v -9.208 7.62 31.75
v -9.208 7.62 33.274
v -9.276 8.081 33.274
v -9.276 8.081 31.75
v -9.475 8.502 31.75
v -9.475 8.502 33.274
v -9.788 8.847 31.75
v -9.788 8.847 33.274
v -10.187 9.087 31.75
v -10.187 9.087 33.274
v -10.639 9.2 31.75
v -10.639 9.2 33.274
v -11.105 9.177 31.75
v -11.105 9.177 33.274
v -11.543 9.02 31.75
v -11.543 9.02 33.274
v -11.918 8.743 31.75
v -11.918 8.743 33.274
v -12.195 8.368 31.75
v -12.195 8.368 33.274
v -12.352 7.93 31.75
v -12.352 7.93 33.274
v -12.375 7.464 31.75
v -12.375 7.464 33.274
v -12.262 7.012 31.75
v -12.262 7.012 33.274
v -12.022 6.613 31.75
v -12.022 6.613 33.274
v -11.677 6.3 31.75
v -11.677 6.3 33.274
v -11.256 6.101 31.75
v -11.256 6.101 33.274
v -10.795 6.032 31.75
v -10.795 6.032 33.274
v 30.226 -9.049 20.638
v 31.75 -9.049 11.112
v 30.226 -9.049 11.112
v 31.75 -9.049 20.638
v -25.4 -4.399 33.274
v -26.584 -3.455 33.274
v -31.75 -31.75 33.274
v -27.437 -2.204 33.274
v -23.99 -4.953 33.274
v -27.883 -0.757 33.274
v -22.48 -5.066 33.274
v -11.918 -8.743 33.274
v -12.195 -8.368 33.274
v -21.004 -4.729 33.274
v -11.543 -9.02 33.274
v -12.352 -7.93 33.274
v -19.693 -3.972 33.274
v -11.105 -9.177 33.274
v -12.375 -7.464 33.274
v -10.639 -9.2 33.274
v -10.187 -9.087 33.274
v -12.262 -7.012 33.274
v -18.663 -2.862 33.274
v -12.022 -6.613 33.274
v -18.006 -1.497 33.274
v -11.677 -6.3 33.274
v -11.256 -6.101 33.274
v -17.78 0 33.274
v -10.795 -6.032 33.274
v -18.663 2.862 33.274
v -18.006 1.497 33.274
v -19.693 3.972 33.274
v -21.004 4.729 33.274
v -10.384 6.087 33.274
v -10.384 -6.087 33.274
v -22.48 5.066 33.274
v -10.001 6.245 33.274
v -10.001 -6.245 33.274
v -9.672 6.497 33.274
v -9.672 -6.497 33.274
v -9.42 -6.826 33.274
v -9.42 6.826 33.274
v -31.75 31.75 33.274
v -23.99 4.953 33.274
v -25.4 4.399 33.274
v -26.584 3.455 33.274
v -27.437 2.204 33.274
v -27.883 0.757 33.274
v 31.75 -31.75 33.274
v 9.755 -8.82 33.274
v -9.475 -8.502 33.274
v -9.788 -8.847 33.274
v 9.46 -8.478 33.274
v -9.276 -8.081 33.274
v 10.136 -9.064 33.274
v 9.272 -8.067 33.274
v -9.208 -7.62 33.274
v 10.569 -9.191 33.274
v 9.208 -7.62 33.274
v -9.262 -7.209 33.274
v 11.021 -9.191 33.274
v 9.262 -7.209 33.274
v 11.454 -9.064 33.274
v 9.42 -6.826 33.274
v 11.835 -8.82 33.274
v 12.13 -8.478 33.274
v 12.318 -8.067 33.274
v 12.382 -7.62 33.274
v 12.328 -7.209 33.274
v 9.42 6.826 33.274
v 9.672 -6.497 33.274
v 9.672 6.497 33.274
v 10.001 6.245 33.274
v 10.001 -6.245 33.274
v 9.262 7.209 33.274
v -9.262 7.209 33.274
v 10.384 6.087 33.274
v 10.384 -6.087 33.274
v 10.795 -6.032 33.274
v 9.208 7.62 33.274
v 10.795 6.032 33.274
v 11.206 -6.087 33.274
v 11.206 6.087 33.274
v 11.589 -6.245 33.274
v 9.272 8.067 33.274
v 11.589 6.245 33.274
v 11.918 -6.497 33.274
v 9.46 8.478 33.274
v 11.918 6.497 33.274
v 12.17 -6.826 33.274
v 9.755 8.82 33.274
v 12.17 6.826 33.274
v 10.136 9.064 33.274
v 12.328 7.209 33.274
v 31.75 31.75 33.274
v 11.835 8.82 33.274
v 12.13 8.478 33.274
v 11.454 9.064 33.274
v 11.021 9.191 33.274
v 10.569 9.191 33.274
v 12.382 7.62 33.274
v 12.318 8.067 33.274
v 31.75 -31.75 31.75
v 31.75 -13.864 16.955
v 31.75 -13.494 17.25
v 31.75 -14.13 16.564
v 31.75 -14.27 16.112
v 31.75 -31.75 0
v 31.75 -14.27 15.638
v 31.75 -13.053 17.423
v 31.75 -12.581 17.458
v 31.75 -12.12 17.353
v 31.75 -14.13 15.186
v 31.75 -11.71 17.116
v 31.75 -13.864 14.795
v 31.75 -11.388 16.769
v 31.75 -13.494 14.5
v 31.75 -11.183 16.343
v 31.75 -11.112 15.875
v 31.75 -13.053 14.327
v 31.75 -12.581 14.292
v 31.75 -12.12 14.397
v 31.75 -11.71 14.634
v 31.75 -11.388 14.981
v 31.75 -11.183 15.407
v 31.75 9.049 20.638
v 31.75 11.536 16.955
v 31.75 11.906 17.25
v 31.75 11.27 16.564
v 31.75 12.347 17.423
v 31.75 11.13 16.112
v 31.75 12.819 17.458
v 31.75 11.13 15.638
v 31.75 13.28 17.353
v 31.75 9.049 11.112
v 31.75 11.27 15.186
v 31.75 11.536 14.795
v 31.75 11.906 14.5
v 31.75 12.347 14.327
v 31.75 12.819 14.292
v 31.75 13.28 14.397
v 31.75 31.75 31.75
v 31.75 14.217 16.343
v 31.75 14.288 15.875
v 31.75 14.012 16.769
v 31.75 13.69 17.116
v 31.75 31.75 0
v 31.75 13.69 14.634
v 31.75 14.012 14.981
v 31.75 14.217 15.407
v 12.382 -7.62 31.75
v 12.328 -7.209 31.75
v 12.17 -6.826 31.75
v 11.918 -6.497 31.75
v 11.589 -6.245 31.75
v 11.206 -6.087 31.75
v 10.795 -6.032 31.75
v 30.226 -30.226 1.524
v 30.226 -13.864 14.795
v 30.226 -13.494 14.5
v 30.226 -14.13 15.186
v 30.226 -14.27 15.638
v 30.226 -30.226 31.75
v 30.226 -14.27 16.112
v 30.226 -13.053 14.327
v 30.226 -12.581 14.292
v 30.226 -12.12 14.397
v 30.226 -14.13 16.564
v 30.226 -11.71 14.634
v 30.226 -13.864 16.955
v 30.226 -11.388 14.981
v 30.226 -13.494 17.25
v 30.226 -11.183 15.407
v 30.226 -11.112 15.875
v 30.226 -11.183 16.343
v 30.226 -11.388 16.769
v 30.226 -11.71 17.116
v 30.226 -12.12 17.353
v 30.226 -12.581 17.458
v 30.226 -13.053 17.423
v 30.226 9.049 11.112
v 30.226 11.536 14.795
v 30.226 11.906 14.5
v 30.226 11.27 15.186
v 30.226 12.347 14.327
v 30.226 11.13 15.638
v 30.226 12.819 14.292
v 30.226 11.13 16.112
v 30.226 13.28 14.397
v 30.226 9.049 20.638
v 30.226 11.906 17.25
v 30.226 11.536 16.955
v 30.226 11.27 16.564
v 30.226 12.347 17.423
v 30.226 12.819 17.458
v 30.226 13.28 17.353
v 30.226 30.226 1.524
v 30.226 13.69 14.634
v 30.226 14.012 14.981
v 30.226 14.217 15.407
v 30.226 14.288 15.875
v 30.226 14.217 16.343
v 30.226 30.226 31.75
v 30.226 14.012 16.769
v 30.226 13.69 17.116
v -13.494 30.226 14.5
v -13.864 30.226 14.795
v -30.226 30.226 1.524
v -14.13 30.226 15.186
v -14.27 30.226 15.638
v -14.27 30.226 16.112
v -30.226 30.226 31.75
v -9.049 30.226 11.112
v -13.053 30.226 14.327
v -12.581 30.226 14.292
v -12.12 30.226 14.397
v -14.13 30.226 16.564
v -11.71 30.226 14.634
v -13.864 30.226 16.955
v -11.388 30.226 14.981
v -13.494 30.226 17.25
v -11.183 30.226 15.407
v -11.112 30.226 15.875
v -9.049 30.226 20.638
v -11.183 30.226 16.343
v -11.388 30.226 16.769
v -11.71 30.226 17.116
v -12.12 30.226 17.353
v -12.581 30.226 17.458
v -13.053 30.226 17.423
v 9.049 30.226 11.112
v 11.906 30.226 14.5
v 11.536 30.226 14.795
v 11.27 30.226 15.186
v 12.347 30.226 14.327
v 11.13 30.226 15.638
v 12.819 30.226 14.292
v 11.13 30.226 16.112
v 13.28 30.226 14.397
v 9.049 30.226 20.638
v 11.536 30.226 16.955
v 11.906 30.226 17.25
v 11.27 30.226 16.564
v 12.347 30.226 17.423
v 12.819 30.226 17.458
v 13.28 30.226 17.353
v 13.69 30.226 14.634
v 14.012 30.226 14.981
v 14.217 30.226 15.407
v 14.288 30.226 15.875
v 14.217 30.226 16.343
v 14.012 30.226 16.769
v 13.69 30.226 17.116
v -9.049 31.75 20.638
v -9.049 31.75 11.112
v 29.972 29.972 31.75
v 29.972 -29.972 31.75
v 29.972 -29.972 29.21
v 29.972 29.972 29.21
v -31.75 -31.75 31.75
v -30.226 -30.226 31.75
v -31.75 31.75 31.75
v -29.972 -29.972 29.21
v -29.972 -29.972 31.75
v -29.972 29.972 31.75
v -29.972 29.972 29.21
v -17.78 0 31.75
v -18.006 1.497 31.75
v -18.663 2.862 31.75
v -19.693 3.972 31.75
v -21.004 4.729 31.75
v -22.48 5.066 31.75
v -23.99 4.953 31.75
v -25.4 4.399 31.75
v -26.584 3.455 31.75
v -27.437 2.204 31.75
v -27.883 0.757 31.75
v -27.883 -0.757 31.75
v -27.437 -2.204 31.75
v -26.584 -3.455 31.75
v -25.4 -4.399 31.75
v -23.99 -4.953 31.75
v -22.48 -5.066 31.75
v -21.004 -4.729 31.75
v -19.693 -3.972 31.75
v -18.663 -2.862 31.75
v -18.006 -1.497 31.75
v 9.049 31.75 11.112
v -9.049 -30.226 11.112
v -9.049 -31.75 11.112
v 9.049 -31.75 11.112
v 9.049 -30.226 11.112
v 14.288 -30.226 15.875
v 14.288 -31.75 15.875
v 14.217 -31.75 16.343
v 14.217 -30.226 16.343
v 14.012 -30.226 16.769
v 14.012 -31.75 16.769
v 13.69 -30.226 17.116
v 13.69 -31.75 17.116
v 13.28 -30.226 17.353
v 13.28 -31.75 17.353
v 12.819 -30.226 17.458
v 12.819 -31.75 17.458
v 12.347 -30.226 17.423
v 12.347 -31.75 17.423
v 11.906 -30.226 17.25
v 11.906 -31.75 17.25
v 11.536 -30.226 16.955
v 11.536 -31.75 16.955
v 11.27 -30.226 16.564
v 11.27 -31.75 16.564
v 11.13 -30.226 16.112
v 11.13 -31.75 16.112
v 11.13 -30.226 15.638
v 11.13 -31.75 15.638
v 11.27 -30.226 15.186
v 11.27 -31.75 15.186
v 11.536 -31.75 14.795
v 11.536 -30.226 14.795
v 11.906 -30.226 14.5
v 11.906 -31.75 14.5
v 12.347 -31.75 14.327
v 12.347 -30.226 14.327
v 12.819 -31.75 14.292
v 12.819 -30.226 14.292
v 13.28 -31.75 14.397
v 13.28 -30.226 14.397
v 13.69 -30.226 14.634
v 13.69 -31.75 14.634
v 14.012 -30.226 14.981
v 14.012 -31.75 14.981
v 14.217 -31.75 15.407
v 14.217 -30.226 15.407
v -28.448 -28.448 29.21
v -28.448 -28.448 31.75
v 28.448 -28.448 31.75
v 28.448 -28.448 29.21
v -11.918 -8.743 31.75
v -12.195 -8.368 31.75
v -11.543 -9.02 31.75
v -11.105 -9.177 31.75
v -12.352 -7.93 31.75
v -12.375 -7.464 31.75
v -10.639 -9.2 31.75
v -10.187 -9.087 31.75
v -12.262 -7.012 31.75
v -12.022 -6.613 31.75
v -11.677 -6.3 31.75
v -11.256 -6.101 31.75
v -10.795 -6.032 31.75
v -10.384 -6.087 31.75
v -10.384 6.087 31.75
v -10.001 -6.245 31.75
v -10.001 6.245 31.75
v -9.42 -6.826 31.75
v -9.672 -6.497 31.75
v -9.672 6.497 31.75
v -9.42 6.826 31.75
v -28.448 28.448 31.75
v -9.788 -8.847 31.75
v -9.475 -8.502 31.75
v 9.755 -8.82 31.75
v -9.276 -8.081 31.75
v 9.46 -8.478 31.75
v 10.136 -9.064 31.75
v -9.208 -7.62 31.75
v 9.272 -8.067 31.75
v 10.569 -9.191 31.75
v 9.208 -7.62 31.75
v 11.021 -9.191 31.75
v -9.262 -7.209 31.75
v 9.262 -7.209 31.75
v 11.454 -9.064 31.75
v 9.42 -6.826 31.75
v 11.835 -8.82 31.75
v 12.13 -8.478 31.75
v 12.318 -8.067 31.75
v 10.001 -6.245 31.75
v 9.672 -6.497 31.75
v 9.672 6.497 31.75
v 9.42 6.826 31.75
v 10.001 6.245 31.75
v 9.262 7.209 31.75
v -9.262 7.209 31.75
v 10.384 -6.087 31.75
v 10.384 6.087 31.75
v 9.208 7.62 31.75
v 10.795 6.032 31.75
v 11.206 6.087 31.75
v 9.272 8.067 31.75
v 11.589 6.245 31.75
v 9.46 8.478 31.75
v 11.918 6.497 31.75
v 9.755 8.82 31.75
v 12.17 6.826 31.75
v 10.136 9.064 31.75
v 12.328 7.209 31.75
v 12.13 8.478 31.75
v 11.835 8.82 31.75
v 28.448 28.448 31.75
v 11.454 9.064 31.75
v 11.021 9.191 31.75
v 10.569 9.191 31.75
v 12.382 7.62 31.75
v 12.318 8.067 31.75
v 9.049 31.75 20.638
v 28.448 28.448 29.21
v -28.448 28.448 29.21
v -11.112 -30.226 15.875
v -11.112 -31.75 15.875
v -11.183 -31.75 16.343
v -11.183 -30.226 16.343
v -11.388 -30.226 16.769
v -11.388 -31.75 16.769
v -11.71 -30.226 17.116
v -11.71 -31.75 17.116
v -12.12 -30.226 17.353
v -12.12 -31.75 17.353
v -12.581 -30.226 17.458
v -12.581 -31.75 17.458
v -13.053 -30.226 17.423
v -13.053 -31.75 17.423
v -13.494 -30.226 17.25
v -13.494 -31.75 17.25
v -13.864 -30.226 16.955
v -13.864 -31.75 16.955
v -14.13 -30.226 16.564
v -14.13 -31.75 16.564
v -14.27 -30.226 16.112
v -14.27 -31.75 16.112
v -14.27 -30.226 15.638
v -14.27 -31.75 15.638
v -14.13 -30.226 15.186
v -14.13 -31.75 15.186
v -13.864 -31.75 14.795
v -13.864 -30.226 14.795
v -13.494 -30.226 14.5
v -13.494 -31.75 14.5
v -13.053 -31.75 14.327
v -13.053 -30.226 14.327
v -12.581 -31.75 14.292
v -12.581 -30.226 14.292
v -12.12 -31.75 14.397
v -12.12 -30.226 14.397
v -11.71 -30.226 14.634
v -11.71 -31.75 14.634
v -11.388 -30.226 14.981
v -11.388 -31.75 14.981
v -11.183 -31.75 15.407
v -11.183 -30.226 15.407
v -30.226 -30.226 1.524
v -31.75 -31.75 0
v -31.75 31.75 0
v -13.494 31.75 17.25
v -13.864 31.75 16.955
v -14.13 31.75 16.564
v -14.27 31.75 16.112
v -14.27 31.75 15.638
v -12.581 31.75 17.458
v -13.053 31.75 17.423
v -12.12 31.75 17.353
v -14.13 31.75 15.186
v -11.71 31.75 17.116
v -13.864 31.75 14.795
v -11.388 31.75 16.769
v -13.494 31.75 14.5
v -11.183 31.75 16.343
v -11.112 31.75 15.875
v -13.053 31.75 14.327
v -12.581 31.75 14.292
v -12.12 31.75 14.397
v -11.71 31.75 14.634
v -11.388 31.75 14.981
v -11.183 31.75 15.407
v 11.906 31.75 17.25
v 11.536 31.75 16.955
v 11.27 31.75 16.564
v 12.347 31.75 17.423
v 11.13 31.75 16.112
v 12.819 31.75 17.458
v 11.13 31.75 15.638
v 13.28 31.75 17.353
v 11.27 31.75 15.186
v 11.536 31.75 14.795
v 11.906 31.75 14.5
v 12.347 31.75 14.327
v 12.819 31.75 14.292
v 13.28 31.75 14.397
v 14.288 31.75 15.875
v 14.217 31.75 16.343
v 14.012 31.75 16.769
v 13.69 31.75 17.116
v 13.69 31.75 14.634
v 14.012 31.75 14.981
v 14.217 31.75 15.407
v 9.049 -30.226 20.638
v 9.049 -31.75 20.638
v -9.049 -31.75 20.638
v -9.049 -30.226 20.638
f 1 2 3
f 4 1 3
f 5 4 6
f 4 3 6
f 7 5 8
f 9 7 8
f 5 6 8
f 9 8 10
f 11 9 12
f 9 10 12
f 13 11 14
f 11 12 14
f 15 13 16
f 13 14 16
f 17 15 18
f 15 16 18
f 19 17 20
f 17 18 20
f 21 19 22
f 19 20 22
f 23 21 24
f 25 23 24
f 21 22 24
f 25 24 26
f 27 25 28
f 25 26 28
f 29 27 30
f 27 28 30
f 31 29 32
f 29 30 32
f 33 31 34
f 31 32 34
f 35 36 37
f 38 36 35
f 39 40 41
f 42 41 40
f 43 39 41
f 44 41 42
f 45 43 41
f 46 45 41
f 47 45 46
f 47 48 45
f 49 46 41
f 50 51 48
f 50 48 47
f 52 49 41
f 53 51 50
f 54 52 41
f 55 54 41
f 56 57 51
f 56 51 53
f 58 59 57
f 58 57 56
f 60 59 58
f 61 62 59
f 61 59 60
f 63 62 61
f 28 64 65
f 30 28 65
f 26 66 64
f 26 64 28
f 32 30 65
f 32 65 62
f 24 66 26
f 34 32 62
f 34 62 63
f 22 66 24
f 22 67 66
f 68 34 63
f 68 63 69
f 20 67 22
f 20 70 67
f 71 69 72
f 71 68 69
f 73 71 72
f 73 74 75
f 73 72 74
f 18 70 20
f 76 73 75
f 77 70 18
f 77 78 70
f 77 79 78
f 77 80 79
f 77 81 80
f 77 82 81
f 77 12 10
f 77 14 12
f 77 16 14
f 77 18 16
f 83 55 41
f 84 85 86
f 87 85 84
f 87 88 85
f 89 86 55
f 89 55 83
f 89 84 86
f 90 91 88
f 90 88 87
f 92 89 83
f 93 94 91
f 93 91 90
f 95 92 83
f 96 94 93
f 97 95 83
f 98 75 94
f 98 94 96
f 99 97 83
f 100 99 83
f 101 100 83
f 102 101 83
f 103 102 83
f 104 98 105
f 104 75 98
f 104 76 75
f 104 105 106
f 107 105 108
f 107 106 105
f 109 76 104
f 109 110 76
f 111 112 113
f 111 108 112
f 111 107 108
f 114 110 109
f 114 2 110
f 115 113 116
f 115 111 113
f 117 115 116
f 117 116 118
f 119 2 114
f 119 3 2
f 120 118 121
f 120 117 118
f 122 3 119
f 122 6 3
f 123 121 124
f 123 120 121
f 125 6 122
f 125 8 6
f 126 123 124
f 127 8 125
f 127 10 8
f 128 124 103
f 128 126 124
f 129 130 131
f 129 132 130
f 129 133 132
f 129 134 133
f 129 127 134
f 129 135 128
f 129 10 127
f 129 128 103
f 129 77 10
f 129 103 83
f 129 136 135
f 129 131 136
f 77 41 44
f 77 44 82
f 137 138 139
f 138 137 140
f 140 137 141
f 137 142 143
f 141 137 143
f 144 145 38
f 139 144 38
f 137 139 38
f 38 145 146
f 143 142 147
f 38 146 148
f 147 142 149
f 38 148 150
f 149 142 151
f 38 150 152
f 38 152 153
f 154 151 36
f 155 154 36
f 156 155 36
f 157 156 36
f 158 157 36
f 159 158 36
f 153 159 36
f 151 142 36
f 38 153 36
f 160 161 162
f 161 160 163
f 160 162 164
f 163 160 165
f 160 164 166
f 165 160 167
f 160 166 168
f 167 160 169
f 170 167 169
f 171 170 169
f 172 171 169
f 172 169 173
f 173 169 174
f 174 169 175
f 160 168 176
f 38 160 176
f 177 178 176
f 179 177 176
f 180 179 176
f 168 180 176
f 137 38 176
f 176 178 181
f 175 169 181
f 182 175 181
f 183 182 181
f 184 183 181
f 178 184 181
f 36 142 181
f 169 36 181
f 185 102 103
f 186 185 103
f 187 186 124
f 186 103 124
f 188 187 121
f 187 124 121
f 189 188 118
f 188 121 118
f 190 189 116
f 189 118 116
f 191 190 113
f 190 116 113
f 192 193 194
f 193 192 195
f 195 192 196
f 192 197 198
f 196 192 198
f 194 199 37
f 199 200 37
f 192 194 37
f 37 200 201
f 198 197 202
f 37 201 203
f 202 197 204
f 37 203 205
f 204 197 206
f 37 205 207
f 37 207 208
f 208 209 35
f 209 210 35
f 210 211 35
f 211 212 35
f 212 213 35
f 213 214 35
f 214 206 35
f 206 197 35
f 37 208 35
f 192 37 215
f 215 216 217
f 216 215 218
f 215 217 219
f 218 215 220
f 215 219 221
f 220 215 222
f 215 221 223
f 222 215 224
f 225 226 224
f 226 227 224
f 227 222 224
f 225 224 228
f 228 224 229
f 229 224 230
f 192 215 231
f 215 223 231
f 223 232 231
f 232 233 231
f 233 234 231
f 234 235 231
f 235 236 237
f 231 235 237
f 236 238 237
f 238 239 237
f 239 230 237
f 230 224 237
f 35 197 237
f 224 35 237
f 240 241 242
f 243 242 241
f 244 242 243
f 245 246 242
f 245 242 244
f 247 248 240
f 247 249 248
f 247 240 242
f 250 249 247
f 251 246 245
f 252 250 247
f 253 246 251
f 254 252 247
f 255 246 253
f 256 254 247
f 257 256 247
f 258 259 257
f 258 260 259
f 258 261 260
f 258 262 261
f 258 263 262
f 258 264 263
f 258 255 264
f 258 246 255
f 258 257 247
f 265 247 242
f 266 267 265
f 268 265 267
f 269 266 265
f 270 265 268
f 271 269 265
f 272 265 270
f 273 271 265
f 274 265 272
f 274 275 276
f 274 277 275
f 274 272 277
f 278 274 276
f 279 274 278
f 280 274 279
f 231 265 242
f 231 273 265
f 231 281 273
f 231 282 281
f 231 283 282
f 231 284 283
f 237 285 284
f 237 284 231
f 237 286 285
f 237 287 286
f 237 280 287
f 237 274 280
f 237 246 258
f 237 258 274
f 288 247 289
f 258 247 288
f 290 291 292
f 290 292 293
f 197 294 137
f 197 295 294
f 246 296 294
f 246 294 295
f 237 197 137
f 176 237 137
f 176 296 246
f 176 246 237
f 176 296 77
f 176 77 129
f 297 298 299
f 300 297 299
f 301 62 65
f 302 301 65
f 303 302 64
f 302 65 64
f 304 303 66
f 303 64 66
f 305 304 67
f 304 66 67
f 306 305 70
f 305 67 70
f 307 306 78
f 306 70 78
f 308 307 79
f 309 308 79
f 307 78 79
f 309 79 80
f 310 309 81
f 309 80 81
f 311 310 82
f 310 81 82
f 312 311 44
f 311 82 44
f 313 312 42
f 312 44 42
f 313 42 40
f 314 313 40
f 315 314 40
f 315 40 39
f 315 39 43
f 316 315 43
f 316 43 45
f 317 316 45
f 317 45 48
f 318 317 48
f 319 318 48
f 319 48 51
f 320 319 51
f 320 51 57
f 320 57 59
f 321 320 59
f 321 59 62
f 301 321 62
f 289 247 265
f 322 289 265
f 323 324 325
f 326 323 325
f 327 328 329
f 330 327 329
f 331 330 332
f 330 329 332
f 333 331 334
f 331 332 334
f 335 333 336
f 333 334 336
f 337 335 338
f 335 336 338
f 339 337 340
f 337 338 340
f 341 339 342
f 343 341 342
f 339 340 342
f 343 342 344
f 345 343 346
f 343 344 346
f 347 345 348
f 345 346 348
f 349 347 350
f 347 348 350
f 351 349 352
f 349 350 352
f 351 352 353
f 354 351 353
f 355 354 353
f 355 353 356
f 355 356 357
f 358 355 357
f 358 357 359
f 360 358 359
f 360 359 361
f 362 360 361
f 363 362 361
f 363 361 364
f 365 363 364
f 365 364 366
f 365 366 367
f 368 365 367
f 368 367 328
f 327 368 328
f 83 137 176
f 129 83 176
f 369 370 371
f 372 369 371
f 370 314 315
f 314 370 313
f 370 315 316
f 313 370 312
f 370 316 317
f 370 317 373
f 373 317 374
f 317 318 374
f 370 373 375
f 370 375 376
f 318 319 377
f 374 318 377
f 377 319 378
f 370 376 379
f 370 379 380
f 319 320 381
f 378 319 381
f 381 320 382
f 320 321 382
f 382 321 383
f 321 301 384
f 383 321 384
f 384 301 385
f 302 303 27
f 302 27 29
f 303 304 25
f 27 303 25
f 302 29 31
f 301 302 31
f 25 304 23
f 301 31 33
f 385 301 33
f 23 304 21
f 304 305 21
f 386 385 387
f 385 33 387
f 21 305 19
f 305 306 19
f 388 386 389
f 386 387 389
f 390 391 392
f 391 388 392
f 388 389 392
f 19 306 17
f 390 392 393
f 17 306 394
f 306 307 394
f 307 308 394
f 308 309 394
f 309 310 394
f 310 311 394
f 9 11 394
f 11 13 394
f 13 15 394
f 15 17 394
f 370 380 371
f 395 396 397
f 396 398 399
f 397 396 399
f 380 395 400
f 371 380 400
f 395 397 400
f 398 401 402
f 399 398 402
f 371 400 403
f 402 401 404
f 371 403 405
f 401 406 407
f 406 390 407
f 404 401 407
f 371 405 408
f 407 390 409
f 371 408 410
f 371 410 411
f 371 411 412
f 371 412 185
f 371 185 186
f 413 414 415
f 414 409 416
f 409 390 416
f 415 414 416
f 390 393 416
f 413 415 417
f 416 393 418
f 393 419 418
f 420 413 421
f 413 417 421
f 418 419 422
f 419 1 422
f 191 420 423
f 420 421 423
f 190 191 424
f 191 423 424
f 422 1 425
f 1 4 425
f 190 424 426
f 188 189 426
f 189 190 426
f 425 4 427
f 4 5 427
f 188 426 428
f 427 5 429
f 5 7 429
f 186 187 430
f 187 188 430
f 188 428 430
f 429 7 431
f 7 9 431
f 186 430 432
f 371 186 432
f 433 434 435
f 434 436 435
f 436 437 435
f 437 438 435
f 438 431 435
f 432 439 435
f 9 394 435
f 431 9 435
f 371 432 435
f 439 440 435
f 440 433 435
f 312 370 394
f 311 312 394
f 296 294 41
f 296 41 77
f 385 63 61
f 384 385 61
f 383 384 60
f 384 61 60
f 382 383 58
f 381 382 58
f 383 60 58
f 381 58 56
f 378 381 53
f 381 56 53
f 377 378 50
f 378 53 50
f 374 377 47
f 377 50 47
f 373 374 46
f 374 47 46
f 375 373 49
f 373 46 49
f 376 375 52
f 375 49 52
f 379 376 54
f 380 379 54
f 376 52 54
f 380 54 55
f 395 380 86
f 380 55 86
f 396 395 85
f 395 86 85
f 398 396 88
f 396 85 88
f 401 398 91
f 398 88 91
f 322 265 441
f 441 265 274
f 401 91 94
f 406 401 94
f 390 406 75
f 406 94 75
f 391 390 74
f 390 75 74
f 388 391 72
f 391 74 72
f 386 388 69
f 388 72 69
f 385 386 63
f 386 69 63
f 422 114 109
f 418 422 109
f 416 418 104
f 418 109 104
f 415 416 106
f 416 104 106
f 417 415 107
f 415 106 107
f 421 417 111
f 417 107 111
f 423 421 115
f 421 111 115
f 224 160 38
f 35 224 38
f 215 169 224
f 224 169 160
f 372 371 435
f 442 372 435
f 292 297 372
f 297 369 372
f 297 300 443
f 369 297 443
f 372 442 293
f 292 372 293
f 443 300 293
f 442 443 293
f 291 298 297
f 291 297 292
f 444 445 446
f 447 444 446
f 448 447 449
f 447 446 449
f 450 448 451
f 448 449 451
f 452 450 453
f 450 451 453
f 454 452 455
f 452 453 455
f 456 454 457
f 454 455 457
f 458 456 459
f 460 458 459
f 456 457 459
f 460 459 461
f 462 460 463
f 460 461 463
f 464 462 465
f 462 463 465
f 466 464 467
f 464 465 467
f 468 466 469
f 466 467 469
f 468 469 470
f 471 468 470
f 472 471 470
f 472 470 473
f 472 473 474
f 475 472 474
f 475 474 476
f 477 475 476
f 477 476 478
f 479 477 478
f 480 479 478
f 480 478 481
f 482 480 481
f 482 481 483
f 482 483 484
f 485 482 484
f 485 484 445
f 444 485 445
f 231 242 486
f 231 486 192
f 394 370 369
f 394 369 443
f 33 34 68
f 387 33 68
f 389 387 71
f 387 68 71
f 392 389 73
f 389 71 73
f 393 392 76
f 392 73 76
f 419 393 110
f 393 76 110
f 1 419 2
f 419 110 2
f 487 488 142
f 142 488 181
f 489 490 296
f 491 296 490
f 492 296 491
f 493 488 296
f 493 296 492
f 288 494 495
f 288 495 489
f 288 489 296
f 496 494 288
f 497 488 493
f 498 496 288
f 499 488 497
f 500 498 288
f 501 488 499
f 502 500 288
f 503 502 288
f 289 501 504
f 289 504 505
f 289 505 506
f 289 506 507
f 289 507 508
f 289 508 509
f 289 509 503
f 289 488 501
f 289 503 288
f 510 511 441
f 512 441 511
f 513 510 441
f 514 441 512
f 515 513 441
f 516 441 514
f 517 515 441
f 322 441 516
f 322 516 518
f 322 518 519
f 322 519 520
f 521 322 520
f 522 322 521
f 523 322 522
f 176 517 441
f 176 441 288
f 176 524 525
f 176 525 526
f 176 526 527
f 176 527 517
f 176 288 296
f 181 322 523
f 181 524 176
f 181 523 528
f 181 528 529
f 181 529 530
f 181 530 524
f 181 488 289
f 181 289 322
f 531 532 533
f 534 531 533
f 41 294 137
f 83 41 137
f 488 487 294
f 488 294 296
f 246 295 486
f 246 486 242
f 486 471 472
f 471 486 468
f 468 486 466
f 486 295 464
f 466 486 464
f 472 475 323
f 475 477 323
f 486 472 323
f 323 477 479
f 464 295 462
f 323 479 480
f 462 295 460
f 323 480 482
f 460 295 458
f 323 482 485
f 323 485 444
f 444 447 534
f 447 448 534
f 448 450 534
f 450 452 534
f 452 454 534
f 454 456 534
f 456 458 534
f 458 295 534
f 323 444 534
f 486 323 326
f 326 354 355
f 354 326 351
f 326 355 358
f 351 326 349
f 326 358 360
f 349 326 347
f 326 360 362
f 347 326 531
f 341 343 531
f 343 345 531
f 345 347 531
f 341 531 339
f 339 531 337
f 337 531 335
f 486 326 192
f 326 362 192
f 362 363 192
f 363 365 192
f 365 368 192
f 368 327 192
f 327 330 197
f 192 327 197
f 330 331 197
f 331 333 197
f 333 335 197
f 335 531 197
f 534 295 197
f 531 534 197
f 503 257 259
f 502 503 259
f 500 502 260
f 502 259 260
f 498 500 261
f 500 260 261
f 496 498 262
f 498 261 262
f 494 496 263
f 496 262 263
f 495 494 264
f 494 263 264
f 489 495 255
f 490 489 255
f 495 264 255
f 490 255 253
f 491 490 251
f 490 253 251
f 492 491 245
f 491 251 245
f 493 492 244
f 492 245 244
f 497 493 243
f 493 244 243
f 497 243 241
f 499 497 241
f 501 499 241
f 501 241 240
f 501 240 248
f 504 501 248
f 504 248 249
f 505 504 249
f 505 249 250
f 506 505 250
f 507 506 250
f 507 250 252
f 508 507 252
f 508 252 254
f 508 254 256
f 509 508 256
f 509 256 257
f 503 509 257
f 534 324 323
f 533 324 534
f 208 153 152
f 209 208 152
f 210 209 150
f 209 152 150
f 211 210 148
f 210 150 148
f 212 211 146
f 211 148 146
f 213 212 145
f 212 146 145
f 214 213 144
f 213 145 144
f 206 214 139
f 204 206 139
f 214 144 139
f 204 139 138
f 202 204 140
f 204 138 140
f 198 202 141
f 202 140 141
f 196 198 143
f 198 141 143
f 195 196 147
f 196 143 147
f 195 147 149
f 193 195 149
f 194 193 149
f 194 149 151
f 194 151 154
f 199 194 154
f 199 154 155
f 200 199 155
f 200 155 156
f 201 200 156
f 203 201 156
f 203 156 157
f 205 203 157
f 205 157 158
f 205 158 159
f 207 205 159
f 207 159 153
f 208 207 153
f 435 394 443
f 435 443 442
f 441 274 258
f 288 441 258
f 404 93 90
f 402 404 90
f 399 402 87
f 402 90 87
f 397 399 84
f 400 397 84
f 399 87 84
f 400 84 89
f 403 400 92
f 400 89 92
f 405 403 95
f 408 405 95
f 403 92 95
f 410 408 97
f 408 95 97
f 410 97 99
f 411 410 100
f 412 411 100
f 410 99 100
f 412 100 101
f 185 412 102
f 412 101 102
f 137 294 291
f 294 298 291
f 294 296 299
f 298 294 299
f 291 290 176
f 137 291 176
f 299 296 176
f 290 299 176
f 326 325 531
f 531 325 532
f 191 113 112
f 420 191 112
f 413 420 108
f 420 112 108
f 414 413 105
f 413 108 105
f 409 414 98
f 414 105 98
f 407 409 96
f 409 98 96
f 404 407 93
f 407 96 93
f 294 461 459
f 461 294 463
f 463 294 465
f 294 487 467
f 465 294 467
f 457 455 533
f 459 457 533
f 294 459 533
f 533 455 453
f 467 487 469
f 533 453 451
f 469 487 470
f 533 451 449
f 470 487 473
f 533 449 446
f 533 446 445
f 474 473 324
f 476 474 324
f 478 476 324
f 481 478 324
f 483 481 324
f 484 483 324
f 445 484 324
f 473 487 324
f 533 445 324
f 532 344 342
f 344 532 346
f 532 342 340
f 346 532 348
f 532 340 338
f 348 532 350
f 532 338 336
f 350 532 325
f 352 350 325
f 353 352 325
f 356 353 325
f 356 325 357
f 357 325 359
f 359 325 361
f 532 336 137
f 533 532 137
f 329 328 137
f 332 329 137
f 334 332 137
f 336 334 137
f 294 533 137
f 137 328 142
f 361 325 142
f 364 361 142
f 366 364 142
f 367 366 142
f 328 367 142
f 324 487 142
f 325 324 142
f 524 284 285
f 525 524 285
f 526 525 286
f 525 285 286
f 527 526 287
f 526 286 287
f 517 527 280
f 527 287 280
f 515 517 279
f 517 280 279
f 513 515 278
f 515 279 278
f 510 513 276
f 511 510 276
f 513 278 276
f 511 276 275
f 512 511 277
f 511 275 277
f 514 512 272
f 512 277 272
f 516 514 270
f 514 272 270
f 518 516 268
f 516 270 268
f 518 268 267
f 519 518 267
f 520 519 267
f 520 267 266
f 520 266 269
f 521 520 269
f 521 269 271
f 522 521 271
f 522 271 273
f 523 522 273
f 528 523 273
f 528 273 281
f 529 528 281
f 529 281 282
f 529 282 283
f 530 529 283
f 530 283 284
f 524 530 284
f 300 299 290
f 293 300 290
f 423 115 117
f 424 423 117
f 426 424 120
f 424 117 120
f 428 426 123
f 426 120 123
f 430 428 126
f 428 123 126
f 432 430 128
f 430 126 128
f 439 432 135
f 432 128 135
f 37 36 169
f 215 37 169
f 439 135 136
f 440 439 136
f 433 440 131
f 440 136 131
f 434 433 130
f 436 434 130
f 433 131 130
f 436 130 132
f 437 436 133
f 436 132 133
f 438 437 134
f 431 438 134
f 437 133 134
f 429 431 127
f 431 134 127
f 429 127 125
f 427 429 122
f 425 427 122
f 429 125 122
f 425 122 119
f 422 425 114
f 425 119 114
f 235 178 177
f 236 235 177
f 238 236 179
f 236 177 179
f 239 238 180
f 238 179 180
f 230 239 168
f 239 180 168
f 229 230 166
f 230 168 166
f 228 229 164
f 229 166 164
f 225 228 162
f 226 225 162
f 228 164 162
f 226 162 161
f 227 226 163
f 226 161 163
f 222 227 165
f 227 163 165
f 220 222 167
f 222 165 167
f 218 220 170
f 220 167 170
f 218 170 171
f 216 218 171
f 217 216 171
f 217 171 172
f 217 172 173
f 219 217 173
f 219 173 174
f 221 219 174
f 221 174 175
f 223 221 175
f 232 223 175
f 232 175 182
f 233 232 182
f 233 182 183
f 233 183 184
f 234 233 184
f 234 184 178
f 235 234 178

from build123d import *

# Parameters (mm, degrees)
F0_W      = 63.5
F0_H      = 63.5
F1_DEPTH  = 31.75
F2_W      = 60.452
F2_H      = 60.452
F3_DEPTH  = 30.226
F4_W      = 9.04875
F4_H      = 9.525
F4_R      = 1.5875
F5_DEPTH  = 76.2
F6_W      = 9.04875
F6_H      = 9.525
F6_R      = 1.5875
F7_DEPTH  = 25.4
F8_W      = 59.944
F8_H      = 59.944
F8_W_2    = 56.896
F8_H_2    = 56.896
F9_DEPTH  = 2.54
F10_W     = 63.5
F10_H     = 63.5
F11_DEPTH = 1.524
F12_R     = 5.08
F13_DEPTH = 25.4


with BuildPart() as f1:
    # F0 (on Top) → F1 (new body)
    with BuildSketch(Plane.XY):
        Rectangle(F0_W, F0_H)
    extrude(amount=F1_DEPTH)

    # F2 (on face) → F3 (cut)
    with BuildSketch(Plane.XY.offset(31.75)):
        Rectangle(F2_W, F2_H)
    extrude(amount=-F3_DEPTH, mode=Mode.SUBTRACT)

    # F4 (on face) → F5 (cut)
    with BuildSketch(Plane.XZ.offset(31.75)):
        with Locations((-4.524375, 15.875)):
            Rectangle(F4_W, F4_H)
        with Locations((4.524375, 15.875)):
            Rectangle(F4_W, F4_H)
        with Locations((-12.7, 15.875)):
            Circle(F4_R)
        with Locations((12.7, 15.875)):
            Circle(F4_R)
    extrude(amount=-F5_DEPTH, mode=Mode.SUBTRACT)

    # F6 (on face) → F7 (cut)
    with BuildSketch(Plane.YZ.offset(31.75)):
        with Locations((-4.524375, 15.875)):
            Rectangle(F6_W, F6_H)
        with Locations((4.524375, 15.875)):
            Rectangle(F6_W, F6_H)
        with Locations((-12.7, 15.875)):
            Circle(F6_R)
        with Locations((12.7, 15.875)):
            Circle(F6_R)
    extrude(amount=-F7_DEPTH, mode=Mode.SUBTRACT)


with BuildPart() as f9:
    # F8 (on face) → F9 (new body)
    with BuildSketch(Plane.XY.offset(31.75)):
        Rectangle(F8_W, F8_H)
        Rectangle(F8_W_2, F8_H_2, mode=Mode.SUBTRACT)
    extrude(amount=-F9_DEPTH)

    # F10 (on face) → F11 (join)
    with BuildSketch(Plane.XY.offset(31.75)):
        Rectangle(F10_W, F10_H)
    extrude(amount=F11_DEPTH)

    # F12 (on face) → F13 (cut)
    with BuildSketch(Plane.XY.offset(33.274)):
        with BuildLine():
            Line((10.795, 7.62), (9.2075, 7.62))
            ThreePointArc((9.2075, 7.62), (9.6724679849, 6.4974679849), (10.795, 6.0325))
            Line((10.795, 6.0325), (10.795, 7.62))
        make_face()
        with BuildLine():
            ThreePointArc((12.3825, 7.62), (10.795, 9.2075), (9.2075, 7.62))
            Line((9.2075, 7.62), (10.795, 7.62))
            Line((10.795, 7.62), (10.795, 6.0325))
            ThreePointArc((10.795, 6.0325), (11.9175320151, 6.4974679849), (12.3825, 7.62))
        make_face()
        with BuildLine():
            Line((-10.795, 7.62), (-9.2075, 7.62))
            ThreePointArc((-9.2075, 7.62), (-11.9175320151, 8.7425320151), (-10.795, 6.0325))
            Line((-10.795, 6.0325), (-10.795, 7.62))
        make_face()
        with BuildLine():
            ThreePointArc((-10.795, 6.0325), (-9.6724679849, 6.4974679849), (-9.2075, 7.62))
            Line((-9.2075, 7.62), (-10.795, 7.62))
            Line((-10.795, 7.62), (-10.795, 6.0325))
        make_face()
        with BuildLine():
            Line((10.795, -7.62), (10.795, -6.0325))
            ThreePointArc((10.795, -6.0325), (9.6724679849, -6.4974679849), (9.2075, -7.62))
            Line((9.2075, -7.62), (10.795, -7.62))
        make_face()
        with BuildLine():
            ThreePointArc((12.3825, -7.62), (11.9175320151, -6.4974679849), (10.795, -6.0325))
            Line((10.795, -6.0325), (10.795, -7.62))
            Line((10.795, -7.62), (9.2075, -7.62))
            ThreePointArc((9.2075, -7.62), (10.795, -9.2075), (12.3825, -7.62))
        make_face()
        with BuildLine():
            ThreePointArc((-9.2075, -7.62), (-9.6724679849, -6.4974679849), (-10.795, -6.0325))
            Line((-10.795, -6.0325), (-10.795, -7.62))
            Line((-10.795, -7.62), (-9.2075, -7.62))
        make_face()
        with BuildLine():
            Line((-10.795, -7.62), (-10.795, -6.0325))
            ThreePointArc((-10.795, -6.0325), (-11.9175320151, -8.7425320151), (-9.2075, -7.62))
            Line((-9.2075, -7.62), (-10.795, -7.62))
        make_face()
        with Locations((-22.86, 0)):
            Circle(F12_R)
    extrude(amount=-F13_DEPTH, mode=Mode.SUBTRACT)


solid = Compound([f1.part, f9.part])
